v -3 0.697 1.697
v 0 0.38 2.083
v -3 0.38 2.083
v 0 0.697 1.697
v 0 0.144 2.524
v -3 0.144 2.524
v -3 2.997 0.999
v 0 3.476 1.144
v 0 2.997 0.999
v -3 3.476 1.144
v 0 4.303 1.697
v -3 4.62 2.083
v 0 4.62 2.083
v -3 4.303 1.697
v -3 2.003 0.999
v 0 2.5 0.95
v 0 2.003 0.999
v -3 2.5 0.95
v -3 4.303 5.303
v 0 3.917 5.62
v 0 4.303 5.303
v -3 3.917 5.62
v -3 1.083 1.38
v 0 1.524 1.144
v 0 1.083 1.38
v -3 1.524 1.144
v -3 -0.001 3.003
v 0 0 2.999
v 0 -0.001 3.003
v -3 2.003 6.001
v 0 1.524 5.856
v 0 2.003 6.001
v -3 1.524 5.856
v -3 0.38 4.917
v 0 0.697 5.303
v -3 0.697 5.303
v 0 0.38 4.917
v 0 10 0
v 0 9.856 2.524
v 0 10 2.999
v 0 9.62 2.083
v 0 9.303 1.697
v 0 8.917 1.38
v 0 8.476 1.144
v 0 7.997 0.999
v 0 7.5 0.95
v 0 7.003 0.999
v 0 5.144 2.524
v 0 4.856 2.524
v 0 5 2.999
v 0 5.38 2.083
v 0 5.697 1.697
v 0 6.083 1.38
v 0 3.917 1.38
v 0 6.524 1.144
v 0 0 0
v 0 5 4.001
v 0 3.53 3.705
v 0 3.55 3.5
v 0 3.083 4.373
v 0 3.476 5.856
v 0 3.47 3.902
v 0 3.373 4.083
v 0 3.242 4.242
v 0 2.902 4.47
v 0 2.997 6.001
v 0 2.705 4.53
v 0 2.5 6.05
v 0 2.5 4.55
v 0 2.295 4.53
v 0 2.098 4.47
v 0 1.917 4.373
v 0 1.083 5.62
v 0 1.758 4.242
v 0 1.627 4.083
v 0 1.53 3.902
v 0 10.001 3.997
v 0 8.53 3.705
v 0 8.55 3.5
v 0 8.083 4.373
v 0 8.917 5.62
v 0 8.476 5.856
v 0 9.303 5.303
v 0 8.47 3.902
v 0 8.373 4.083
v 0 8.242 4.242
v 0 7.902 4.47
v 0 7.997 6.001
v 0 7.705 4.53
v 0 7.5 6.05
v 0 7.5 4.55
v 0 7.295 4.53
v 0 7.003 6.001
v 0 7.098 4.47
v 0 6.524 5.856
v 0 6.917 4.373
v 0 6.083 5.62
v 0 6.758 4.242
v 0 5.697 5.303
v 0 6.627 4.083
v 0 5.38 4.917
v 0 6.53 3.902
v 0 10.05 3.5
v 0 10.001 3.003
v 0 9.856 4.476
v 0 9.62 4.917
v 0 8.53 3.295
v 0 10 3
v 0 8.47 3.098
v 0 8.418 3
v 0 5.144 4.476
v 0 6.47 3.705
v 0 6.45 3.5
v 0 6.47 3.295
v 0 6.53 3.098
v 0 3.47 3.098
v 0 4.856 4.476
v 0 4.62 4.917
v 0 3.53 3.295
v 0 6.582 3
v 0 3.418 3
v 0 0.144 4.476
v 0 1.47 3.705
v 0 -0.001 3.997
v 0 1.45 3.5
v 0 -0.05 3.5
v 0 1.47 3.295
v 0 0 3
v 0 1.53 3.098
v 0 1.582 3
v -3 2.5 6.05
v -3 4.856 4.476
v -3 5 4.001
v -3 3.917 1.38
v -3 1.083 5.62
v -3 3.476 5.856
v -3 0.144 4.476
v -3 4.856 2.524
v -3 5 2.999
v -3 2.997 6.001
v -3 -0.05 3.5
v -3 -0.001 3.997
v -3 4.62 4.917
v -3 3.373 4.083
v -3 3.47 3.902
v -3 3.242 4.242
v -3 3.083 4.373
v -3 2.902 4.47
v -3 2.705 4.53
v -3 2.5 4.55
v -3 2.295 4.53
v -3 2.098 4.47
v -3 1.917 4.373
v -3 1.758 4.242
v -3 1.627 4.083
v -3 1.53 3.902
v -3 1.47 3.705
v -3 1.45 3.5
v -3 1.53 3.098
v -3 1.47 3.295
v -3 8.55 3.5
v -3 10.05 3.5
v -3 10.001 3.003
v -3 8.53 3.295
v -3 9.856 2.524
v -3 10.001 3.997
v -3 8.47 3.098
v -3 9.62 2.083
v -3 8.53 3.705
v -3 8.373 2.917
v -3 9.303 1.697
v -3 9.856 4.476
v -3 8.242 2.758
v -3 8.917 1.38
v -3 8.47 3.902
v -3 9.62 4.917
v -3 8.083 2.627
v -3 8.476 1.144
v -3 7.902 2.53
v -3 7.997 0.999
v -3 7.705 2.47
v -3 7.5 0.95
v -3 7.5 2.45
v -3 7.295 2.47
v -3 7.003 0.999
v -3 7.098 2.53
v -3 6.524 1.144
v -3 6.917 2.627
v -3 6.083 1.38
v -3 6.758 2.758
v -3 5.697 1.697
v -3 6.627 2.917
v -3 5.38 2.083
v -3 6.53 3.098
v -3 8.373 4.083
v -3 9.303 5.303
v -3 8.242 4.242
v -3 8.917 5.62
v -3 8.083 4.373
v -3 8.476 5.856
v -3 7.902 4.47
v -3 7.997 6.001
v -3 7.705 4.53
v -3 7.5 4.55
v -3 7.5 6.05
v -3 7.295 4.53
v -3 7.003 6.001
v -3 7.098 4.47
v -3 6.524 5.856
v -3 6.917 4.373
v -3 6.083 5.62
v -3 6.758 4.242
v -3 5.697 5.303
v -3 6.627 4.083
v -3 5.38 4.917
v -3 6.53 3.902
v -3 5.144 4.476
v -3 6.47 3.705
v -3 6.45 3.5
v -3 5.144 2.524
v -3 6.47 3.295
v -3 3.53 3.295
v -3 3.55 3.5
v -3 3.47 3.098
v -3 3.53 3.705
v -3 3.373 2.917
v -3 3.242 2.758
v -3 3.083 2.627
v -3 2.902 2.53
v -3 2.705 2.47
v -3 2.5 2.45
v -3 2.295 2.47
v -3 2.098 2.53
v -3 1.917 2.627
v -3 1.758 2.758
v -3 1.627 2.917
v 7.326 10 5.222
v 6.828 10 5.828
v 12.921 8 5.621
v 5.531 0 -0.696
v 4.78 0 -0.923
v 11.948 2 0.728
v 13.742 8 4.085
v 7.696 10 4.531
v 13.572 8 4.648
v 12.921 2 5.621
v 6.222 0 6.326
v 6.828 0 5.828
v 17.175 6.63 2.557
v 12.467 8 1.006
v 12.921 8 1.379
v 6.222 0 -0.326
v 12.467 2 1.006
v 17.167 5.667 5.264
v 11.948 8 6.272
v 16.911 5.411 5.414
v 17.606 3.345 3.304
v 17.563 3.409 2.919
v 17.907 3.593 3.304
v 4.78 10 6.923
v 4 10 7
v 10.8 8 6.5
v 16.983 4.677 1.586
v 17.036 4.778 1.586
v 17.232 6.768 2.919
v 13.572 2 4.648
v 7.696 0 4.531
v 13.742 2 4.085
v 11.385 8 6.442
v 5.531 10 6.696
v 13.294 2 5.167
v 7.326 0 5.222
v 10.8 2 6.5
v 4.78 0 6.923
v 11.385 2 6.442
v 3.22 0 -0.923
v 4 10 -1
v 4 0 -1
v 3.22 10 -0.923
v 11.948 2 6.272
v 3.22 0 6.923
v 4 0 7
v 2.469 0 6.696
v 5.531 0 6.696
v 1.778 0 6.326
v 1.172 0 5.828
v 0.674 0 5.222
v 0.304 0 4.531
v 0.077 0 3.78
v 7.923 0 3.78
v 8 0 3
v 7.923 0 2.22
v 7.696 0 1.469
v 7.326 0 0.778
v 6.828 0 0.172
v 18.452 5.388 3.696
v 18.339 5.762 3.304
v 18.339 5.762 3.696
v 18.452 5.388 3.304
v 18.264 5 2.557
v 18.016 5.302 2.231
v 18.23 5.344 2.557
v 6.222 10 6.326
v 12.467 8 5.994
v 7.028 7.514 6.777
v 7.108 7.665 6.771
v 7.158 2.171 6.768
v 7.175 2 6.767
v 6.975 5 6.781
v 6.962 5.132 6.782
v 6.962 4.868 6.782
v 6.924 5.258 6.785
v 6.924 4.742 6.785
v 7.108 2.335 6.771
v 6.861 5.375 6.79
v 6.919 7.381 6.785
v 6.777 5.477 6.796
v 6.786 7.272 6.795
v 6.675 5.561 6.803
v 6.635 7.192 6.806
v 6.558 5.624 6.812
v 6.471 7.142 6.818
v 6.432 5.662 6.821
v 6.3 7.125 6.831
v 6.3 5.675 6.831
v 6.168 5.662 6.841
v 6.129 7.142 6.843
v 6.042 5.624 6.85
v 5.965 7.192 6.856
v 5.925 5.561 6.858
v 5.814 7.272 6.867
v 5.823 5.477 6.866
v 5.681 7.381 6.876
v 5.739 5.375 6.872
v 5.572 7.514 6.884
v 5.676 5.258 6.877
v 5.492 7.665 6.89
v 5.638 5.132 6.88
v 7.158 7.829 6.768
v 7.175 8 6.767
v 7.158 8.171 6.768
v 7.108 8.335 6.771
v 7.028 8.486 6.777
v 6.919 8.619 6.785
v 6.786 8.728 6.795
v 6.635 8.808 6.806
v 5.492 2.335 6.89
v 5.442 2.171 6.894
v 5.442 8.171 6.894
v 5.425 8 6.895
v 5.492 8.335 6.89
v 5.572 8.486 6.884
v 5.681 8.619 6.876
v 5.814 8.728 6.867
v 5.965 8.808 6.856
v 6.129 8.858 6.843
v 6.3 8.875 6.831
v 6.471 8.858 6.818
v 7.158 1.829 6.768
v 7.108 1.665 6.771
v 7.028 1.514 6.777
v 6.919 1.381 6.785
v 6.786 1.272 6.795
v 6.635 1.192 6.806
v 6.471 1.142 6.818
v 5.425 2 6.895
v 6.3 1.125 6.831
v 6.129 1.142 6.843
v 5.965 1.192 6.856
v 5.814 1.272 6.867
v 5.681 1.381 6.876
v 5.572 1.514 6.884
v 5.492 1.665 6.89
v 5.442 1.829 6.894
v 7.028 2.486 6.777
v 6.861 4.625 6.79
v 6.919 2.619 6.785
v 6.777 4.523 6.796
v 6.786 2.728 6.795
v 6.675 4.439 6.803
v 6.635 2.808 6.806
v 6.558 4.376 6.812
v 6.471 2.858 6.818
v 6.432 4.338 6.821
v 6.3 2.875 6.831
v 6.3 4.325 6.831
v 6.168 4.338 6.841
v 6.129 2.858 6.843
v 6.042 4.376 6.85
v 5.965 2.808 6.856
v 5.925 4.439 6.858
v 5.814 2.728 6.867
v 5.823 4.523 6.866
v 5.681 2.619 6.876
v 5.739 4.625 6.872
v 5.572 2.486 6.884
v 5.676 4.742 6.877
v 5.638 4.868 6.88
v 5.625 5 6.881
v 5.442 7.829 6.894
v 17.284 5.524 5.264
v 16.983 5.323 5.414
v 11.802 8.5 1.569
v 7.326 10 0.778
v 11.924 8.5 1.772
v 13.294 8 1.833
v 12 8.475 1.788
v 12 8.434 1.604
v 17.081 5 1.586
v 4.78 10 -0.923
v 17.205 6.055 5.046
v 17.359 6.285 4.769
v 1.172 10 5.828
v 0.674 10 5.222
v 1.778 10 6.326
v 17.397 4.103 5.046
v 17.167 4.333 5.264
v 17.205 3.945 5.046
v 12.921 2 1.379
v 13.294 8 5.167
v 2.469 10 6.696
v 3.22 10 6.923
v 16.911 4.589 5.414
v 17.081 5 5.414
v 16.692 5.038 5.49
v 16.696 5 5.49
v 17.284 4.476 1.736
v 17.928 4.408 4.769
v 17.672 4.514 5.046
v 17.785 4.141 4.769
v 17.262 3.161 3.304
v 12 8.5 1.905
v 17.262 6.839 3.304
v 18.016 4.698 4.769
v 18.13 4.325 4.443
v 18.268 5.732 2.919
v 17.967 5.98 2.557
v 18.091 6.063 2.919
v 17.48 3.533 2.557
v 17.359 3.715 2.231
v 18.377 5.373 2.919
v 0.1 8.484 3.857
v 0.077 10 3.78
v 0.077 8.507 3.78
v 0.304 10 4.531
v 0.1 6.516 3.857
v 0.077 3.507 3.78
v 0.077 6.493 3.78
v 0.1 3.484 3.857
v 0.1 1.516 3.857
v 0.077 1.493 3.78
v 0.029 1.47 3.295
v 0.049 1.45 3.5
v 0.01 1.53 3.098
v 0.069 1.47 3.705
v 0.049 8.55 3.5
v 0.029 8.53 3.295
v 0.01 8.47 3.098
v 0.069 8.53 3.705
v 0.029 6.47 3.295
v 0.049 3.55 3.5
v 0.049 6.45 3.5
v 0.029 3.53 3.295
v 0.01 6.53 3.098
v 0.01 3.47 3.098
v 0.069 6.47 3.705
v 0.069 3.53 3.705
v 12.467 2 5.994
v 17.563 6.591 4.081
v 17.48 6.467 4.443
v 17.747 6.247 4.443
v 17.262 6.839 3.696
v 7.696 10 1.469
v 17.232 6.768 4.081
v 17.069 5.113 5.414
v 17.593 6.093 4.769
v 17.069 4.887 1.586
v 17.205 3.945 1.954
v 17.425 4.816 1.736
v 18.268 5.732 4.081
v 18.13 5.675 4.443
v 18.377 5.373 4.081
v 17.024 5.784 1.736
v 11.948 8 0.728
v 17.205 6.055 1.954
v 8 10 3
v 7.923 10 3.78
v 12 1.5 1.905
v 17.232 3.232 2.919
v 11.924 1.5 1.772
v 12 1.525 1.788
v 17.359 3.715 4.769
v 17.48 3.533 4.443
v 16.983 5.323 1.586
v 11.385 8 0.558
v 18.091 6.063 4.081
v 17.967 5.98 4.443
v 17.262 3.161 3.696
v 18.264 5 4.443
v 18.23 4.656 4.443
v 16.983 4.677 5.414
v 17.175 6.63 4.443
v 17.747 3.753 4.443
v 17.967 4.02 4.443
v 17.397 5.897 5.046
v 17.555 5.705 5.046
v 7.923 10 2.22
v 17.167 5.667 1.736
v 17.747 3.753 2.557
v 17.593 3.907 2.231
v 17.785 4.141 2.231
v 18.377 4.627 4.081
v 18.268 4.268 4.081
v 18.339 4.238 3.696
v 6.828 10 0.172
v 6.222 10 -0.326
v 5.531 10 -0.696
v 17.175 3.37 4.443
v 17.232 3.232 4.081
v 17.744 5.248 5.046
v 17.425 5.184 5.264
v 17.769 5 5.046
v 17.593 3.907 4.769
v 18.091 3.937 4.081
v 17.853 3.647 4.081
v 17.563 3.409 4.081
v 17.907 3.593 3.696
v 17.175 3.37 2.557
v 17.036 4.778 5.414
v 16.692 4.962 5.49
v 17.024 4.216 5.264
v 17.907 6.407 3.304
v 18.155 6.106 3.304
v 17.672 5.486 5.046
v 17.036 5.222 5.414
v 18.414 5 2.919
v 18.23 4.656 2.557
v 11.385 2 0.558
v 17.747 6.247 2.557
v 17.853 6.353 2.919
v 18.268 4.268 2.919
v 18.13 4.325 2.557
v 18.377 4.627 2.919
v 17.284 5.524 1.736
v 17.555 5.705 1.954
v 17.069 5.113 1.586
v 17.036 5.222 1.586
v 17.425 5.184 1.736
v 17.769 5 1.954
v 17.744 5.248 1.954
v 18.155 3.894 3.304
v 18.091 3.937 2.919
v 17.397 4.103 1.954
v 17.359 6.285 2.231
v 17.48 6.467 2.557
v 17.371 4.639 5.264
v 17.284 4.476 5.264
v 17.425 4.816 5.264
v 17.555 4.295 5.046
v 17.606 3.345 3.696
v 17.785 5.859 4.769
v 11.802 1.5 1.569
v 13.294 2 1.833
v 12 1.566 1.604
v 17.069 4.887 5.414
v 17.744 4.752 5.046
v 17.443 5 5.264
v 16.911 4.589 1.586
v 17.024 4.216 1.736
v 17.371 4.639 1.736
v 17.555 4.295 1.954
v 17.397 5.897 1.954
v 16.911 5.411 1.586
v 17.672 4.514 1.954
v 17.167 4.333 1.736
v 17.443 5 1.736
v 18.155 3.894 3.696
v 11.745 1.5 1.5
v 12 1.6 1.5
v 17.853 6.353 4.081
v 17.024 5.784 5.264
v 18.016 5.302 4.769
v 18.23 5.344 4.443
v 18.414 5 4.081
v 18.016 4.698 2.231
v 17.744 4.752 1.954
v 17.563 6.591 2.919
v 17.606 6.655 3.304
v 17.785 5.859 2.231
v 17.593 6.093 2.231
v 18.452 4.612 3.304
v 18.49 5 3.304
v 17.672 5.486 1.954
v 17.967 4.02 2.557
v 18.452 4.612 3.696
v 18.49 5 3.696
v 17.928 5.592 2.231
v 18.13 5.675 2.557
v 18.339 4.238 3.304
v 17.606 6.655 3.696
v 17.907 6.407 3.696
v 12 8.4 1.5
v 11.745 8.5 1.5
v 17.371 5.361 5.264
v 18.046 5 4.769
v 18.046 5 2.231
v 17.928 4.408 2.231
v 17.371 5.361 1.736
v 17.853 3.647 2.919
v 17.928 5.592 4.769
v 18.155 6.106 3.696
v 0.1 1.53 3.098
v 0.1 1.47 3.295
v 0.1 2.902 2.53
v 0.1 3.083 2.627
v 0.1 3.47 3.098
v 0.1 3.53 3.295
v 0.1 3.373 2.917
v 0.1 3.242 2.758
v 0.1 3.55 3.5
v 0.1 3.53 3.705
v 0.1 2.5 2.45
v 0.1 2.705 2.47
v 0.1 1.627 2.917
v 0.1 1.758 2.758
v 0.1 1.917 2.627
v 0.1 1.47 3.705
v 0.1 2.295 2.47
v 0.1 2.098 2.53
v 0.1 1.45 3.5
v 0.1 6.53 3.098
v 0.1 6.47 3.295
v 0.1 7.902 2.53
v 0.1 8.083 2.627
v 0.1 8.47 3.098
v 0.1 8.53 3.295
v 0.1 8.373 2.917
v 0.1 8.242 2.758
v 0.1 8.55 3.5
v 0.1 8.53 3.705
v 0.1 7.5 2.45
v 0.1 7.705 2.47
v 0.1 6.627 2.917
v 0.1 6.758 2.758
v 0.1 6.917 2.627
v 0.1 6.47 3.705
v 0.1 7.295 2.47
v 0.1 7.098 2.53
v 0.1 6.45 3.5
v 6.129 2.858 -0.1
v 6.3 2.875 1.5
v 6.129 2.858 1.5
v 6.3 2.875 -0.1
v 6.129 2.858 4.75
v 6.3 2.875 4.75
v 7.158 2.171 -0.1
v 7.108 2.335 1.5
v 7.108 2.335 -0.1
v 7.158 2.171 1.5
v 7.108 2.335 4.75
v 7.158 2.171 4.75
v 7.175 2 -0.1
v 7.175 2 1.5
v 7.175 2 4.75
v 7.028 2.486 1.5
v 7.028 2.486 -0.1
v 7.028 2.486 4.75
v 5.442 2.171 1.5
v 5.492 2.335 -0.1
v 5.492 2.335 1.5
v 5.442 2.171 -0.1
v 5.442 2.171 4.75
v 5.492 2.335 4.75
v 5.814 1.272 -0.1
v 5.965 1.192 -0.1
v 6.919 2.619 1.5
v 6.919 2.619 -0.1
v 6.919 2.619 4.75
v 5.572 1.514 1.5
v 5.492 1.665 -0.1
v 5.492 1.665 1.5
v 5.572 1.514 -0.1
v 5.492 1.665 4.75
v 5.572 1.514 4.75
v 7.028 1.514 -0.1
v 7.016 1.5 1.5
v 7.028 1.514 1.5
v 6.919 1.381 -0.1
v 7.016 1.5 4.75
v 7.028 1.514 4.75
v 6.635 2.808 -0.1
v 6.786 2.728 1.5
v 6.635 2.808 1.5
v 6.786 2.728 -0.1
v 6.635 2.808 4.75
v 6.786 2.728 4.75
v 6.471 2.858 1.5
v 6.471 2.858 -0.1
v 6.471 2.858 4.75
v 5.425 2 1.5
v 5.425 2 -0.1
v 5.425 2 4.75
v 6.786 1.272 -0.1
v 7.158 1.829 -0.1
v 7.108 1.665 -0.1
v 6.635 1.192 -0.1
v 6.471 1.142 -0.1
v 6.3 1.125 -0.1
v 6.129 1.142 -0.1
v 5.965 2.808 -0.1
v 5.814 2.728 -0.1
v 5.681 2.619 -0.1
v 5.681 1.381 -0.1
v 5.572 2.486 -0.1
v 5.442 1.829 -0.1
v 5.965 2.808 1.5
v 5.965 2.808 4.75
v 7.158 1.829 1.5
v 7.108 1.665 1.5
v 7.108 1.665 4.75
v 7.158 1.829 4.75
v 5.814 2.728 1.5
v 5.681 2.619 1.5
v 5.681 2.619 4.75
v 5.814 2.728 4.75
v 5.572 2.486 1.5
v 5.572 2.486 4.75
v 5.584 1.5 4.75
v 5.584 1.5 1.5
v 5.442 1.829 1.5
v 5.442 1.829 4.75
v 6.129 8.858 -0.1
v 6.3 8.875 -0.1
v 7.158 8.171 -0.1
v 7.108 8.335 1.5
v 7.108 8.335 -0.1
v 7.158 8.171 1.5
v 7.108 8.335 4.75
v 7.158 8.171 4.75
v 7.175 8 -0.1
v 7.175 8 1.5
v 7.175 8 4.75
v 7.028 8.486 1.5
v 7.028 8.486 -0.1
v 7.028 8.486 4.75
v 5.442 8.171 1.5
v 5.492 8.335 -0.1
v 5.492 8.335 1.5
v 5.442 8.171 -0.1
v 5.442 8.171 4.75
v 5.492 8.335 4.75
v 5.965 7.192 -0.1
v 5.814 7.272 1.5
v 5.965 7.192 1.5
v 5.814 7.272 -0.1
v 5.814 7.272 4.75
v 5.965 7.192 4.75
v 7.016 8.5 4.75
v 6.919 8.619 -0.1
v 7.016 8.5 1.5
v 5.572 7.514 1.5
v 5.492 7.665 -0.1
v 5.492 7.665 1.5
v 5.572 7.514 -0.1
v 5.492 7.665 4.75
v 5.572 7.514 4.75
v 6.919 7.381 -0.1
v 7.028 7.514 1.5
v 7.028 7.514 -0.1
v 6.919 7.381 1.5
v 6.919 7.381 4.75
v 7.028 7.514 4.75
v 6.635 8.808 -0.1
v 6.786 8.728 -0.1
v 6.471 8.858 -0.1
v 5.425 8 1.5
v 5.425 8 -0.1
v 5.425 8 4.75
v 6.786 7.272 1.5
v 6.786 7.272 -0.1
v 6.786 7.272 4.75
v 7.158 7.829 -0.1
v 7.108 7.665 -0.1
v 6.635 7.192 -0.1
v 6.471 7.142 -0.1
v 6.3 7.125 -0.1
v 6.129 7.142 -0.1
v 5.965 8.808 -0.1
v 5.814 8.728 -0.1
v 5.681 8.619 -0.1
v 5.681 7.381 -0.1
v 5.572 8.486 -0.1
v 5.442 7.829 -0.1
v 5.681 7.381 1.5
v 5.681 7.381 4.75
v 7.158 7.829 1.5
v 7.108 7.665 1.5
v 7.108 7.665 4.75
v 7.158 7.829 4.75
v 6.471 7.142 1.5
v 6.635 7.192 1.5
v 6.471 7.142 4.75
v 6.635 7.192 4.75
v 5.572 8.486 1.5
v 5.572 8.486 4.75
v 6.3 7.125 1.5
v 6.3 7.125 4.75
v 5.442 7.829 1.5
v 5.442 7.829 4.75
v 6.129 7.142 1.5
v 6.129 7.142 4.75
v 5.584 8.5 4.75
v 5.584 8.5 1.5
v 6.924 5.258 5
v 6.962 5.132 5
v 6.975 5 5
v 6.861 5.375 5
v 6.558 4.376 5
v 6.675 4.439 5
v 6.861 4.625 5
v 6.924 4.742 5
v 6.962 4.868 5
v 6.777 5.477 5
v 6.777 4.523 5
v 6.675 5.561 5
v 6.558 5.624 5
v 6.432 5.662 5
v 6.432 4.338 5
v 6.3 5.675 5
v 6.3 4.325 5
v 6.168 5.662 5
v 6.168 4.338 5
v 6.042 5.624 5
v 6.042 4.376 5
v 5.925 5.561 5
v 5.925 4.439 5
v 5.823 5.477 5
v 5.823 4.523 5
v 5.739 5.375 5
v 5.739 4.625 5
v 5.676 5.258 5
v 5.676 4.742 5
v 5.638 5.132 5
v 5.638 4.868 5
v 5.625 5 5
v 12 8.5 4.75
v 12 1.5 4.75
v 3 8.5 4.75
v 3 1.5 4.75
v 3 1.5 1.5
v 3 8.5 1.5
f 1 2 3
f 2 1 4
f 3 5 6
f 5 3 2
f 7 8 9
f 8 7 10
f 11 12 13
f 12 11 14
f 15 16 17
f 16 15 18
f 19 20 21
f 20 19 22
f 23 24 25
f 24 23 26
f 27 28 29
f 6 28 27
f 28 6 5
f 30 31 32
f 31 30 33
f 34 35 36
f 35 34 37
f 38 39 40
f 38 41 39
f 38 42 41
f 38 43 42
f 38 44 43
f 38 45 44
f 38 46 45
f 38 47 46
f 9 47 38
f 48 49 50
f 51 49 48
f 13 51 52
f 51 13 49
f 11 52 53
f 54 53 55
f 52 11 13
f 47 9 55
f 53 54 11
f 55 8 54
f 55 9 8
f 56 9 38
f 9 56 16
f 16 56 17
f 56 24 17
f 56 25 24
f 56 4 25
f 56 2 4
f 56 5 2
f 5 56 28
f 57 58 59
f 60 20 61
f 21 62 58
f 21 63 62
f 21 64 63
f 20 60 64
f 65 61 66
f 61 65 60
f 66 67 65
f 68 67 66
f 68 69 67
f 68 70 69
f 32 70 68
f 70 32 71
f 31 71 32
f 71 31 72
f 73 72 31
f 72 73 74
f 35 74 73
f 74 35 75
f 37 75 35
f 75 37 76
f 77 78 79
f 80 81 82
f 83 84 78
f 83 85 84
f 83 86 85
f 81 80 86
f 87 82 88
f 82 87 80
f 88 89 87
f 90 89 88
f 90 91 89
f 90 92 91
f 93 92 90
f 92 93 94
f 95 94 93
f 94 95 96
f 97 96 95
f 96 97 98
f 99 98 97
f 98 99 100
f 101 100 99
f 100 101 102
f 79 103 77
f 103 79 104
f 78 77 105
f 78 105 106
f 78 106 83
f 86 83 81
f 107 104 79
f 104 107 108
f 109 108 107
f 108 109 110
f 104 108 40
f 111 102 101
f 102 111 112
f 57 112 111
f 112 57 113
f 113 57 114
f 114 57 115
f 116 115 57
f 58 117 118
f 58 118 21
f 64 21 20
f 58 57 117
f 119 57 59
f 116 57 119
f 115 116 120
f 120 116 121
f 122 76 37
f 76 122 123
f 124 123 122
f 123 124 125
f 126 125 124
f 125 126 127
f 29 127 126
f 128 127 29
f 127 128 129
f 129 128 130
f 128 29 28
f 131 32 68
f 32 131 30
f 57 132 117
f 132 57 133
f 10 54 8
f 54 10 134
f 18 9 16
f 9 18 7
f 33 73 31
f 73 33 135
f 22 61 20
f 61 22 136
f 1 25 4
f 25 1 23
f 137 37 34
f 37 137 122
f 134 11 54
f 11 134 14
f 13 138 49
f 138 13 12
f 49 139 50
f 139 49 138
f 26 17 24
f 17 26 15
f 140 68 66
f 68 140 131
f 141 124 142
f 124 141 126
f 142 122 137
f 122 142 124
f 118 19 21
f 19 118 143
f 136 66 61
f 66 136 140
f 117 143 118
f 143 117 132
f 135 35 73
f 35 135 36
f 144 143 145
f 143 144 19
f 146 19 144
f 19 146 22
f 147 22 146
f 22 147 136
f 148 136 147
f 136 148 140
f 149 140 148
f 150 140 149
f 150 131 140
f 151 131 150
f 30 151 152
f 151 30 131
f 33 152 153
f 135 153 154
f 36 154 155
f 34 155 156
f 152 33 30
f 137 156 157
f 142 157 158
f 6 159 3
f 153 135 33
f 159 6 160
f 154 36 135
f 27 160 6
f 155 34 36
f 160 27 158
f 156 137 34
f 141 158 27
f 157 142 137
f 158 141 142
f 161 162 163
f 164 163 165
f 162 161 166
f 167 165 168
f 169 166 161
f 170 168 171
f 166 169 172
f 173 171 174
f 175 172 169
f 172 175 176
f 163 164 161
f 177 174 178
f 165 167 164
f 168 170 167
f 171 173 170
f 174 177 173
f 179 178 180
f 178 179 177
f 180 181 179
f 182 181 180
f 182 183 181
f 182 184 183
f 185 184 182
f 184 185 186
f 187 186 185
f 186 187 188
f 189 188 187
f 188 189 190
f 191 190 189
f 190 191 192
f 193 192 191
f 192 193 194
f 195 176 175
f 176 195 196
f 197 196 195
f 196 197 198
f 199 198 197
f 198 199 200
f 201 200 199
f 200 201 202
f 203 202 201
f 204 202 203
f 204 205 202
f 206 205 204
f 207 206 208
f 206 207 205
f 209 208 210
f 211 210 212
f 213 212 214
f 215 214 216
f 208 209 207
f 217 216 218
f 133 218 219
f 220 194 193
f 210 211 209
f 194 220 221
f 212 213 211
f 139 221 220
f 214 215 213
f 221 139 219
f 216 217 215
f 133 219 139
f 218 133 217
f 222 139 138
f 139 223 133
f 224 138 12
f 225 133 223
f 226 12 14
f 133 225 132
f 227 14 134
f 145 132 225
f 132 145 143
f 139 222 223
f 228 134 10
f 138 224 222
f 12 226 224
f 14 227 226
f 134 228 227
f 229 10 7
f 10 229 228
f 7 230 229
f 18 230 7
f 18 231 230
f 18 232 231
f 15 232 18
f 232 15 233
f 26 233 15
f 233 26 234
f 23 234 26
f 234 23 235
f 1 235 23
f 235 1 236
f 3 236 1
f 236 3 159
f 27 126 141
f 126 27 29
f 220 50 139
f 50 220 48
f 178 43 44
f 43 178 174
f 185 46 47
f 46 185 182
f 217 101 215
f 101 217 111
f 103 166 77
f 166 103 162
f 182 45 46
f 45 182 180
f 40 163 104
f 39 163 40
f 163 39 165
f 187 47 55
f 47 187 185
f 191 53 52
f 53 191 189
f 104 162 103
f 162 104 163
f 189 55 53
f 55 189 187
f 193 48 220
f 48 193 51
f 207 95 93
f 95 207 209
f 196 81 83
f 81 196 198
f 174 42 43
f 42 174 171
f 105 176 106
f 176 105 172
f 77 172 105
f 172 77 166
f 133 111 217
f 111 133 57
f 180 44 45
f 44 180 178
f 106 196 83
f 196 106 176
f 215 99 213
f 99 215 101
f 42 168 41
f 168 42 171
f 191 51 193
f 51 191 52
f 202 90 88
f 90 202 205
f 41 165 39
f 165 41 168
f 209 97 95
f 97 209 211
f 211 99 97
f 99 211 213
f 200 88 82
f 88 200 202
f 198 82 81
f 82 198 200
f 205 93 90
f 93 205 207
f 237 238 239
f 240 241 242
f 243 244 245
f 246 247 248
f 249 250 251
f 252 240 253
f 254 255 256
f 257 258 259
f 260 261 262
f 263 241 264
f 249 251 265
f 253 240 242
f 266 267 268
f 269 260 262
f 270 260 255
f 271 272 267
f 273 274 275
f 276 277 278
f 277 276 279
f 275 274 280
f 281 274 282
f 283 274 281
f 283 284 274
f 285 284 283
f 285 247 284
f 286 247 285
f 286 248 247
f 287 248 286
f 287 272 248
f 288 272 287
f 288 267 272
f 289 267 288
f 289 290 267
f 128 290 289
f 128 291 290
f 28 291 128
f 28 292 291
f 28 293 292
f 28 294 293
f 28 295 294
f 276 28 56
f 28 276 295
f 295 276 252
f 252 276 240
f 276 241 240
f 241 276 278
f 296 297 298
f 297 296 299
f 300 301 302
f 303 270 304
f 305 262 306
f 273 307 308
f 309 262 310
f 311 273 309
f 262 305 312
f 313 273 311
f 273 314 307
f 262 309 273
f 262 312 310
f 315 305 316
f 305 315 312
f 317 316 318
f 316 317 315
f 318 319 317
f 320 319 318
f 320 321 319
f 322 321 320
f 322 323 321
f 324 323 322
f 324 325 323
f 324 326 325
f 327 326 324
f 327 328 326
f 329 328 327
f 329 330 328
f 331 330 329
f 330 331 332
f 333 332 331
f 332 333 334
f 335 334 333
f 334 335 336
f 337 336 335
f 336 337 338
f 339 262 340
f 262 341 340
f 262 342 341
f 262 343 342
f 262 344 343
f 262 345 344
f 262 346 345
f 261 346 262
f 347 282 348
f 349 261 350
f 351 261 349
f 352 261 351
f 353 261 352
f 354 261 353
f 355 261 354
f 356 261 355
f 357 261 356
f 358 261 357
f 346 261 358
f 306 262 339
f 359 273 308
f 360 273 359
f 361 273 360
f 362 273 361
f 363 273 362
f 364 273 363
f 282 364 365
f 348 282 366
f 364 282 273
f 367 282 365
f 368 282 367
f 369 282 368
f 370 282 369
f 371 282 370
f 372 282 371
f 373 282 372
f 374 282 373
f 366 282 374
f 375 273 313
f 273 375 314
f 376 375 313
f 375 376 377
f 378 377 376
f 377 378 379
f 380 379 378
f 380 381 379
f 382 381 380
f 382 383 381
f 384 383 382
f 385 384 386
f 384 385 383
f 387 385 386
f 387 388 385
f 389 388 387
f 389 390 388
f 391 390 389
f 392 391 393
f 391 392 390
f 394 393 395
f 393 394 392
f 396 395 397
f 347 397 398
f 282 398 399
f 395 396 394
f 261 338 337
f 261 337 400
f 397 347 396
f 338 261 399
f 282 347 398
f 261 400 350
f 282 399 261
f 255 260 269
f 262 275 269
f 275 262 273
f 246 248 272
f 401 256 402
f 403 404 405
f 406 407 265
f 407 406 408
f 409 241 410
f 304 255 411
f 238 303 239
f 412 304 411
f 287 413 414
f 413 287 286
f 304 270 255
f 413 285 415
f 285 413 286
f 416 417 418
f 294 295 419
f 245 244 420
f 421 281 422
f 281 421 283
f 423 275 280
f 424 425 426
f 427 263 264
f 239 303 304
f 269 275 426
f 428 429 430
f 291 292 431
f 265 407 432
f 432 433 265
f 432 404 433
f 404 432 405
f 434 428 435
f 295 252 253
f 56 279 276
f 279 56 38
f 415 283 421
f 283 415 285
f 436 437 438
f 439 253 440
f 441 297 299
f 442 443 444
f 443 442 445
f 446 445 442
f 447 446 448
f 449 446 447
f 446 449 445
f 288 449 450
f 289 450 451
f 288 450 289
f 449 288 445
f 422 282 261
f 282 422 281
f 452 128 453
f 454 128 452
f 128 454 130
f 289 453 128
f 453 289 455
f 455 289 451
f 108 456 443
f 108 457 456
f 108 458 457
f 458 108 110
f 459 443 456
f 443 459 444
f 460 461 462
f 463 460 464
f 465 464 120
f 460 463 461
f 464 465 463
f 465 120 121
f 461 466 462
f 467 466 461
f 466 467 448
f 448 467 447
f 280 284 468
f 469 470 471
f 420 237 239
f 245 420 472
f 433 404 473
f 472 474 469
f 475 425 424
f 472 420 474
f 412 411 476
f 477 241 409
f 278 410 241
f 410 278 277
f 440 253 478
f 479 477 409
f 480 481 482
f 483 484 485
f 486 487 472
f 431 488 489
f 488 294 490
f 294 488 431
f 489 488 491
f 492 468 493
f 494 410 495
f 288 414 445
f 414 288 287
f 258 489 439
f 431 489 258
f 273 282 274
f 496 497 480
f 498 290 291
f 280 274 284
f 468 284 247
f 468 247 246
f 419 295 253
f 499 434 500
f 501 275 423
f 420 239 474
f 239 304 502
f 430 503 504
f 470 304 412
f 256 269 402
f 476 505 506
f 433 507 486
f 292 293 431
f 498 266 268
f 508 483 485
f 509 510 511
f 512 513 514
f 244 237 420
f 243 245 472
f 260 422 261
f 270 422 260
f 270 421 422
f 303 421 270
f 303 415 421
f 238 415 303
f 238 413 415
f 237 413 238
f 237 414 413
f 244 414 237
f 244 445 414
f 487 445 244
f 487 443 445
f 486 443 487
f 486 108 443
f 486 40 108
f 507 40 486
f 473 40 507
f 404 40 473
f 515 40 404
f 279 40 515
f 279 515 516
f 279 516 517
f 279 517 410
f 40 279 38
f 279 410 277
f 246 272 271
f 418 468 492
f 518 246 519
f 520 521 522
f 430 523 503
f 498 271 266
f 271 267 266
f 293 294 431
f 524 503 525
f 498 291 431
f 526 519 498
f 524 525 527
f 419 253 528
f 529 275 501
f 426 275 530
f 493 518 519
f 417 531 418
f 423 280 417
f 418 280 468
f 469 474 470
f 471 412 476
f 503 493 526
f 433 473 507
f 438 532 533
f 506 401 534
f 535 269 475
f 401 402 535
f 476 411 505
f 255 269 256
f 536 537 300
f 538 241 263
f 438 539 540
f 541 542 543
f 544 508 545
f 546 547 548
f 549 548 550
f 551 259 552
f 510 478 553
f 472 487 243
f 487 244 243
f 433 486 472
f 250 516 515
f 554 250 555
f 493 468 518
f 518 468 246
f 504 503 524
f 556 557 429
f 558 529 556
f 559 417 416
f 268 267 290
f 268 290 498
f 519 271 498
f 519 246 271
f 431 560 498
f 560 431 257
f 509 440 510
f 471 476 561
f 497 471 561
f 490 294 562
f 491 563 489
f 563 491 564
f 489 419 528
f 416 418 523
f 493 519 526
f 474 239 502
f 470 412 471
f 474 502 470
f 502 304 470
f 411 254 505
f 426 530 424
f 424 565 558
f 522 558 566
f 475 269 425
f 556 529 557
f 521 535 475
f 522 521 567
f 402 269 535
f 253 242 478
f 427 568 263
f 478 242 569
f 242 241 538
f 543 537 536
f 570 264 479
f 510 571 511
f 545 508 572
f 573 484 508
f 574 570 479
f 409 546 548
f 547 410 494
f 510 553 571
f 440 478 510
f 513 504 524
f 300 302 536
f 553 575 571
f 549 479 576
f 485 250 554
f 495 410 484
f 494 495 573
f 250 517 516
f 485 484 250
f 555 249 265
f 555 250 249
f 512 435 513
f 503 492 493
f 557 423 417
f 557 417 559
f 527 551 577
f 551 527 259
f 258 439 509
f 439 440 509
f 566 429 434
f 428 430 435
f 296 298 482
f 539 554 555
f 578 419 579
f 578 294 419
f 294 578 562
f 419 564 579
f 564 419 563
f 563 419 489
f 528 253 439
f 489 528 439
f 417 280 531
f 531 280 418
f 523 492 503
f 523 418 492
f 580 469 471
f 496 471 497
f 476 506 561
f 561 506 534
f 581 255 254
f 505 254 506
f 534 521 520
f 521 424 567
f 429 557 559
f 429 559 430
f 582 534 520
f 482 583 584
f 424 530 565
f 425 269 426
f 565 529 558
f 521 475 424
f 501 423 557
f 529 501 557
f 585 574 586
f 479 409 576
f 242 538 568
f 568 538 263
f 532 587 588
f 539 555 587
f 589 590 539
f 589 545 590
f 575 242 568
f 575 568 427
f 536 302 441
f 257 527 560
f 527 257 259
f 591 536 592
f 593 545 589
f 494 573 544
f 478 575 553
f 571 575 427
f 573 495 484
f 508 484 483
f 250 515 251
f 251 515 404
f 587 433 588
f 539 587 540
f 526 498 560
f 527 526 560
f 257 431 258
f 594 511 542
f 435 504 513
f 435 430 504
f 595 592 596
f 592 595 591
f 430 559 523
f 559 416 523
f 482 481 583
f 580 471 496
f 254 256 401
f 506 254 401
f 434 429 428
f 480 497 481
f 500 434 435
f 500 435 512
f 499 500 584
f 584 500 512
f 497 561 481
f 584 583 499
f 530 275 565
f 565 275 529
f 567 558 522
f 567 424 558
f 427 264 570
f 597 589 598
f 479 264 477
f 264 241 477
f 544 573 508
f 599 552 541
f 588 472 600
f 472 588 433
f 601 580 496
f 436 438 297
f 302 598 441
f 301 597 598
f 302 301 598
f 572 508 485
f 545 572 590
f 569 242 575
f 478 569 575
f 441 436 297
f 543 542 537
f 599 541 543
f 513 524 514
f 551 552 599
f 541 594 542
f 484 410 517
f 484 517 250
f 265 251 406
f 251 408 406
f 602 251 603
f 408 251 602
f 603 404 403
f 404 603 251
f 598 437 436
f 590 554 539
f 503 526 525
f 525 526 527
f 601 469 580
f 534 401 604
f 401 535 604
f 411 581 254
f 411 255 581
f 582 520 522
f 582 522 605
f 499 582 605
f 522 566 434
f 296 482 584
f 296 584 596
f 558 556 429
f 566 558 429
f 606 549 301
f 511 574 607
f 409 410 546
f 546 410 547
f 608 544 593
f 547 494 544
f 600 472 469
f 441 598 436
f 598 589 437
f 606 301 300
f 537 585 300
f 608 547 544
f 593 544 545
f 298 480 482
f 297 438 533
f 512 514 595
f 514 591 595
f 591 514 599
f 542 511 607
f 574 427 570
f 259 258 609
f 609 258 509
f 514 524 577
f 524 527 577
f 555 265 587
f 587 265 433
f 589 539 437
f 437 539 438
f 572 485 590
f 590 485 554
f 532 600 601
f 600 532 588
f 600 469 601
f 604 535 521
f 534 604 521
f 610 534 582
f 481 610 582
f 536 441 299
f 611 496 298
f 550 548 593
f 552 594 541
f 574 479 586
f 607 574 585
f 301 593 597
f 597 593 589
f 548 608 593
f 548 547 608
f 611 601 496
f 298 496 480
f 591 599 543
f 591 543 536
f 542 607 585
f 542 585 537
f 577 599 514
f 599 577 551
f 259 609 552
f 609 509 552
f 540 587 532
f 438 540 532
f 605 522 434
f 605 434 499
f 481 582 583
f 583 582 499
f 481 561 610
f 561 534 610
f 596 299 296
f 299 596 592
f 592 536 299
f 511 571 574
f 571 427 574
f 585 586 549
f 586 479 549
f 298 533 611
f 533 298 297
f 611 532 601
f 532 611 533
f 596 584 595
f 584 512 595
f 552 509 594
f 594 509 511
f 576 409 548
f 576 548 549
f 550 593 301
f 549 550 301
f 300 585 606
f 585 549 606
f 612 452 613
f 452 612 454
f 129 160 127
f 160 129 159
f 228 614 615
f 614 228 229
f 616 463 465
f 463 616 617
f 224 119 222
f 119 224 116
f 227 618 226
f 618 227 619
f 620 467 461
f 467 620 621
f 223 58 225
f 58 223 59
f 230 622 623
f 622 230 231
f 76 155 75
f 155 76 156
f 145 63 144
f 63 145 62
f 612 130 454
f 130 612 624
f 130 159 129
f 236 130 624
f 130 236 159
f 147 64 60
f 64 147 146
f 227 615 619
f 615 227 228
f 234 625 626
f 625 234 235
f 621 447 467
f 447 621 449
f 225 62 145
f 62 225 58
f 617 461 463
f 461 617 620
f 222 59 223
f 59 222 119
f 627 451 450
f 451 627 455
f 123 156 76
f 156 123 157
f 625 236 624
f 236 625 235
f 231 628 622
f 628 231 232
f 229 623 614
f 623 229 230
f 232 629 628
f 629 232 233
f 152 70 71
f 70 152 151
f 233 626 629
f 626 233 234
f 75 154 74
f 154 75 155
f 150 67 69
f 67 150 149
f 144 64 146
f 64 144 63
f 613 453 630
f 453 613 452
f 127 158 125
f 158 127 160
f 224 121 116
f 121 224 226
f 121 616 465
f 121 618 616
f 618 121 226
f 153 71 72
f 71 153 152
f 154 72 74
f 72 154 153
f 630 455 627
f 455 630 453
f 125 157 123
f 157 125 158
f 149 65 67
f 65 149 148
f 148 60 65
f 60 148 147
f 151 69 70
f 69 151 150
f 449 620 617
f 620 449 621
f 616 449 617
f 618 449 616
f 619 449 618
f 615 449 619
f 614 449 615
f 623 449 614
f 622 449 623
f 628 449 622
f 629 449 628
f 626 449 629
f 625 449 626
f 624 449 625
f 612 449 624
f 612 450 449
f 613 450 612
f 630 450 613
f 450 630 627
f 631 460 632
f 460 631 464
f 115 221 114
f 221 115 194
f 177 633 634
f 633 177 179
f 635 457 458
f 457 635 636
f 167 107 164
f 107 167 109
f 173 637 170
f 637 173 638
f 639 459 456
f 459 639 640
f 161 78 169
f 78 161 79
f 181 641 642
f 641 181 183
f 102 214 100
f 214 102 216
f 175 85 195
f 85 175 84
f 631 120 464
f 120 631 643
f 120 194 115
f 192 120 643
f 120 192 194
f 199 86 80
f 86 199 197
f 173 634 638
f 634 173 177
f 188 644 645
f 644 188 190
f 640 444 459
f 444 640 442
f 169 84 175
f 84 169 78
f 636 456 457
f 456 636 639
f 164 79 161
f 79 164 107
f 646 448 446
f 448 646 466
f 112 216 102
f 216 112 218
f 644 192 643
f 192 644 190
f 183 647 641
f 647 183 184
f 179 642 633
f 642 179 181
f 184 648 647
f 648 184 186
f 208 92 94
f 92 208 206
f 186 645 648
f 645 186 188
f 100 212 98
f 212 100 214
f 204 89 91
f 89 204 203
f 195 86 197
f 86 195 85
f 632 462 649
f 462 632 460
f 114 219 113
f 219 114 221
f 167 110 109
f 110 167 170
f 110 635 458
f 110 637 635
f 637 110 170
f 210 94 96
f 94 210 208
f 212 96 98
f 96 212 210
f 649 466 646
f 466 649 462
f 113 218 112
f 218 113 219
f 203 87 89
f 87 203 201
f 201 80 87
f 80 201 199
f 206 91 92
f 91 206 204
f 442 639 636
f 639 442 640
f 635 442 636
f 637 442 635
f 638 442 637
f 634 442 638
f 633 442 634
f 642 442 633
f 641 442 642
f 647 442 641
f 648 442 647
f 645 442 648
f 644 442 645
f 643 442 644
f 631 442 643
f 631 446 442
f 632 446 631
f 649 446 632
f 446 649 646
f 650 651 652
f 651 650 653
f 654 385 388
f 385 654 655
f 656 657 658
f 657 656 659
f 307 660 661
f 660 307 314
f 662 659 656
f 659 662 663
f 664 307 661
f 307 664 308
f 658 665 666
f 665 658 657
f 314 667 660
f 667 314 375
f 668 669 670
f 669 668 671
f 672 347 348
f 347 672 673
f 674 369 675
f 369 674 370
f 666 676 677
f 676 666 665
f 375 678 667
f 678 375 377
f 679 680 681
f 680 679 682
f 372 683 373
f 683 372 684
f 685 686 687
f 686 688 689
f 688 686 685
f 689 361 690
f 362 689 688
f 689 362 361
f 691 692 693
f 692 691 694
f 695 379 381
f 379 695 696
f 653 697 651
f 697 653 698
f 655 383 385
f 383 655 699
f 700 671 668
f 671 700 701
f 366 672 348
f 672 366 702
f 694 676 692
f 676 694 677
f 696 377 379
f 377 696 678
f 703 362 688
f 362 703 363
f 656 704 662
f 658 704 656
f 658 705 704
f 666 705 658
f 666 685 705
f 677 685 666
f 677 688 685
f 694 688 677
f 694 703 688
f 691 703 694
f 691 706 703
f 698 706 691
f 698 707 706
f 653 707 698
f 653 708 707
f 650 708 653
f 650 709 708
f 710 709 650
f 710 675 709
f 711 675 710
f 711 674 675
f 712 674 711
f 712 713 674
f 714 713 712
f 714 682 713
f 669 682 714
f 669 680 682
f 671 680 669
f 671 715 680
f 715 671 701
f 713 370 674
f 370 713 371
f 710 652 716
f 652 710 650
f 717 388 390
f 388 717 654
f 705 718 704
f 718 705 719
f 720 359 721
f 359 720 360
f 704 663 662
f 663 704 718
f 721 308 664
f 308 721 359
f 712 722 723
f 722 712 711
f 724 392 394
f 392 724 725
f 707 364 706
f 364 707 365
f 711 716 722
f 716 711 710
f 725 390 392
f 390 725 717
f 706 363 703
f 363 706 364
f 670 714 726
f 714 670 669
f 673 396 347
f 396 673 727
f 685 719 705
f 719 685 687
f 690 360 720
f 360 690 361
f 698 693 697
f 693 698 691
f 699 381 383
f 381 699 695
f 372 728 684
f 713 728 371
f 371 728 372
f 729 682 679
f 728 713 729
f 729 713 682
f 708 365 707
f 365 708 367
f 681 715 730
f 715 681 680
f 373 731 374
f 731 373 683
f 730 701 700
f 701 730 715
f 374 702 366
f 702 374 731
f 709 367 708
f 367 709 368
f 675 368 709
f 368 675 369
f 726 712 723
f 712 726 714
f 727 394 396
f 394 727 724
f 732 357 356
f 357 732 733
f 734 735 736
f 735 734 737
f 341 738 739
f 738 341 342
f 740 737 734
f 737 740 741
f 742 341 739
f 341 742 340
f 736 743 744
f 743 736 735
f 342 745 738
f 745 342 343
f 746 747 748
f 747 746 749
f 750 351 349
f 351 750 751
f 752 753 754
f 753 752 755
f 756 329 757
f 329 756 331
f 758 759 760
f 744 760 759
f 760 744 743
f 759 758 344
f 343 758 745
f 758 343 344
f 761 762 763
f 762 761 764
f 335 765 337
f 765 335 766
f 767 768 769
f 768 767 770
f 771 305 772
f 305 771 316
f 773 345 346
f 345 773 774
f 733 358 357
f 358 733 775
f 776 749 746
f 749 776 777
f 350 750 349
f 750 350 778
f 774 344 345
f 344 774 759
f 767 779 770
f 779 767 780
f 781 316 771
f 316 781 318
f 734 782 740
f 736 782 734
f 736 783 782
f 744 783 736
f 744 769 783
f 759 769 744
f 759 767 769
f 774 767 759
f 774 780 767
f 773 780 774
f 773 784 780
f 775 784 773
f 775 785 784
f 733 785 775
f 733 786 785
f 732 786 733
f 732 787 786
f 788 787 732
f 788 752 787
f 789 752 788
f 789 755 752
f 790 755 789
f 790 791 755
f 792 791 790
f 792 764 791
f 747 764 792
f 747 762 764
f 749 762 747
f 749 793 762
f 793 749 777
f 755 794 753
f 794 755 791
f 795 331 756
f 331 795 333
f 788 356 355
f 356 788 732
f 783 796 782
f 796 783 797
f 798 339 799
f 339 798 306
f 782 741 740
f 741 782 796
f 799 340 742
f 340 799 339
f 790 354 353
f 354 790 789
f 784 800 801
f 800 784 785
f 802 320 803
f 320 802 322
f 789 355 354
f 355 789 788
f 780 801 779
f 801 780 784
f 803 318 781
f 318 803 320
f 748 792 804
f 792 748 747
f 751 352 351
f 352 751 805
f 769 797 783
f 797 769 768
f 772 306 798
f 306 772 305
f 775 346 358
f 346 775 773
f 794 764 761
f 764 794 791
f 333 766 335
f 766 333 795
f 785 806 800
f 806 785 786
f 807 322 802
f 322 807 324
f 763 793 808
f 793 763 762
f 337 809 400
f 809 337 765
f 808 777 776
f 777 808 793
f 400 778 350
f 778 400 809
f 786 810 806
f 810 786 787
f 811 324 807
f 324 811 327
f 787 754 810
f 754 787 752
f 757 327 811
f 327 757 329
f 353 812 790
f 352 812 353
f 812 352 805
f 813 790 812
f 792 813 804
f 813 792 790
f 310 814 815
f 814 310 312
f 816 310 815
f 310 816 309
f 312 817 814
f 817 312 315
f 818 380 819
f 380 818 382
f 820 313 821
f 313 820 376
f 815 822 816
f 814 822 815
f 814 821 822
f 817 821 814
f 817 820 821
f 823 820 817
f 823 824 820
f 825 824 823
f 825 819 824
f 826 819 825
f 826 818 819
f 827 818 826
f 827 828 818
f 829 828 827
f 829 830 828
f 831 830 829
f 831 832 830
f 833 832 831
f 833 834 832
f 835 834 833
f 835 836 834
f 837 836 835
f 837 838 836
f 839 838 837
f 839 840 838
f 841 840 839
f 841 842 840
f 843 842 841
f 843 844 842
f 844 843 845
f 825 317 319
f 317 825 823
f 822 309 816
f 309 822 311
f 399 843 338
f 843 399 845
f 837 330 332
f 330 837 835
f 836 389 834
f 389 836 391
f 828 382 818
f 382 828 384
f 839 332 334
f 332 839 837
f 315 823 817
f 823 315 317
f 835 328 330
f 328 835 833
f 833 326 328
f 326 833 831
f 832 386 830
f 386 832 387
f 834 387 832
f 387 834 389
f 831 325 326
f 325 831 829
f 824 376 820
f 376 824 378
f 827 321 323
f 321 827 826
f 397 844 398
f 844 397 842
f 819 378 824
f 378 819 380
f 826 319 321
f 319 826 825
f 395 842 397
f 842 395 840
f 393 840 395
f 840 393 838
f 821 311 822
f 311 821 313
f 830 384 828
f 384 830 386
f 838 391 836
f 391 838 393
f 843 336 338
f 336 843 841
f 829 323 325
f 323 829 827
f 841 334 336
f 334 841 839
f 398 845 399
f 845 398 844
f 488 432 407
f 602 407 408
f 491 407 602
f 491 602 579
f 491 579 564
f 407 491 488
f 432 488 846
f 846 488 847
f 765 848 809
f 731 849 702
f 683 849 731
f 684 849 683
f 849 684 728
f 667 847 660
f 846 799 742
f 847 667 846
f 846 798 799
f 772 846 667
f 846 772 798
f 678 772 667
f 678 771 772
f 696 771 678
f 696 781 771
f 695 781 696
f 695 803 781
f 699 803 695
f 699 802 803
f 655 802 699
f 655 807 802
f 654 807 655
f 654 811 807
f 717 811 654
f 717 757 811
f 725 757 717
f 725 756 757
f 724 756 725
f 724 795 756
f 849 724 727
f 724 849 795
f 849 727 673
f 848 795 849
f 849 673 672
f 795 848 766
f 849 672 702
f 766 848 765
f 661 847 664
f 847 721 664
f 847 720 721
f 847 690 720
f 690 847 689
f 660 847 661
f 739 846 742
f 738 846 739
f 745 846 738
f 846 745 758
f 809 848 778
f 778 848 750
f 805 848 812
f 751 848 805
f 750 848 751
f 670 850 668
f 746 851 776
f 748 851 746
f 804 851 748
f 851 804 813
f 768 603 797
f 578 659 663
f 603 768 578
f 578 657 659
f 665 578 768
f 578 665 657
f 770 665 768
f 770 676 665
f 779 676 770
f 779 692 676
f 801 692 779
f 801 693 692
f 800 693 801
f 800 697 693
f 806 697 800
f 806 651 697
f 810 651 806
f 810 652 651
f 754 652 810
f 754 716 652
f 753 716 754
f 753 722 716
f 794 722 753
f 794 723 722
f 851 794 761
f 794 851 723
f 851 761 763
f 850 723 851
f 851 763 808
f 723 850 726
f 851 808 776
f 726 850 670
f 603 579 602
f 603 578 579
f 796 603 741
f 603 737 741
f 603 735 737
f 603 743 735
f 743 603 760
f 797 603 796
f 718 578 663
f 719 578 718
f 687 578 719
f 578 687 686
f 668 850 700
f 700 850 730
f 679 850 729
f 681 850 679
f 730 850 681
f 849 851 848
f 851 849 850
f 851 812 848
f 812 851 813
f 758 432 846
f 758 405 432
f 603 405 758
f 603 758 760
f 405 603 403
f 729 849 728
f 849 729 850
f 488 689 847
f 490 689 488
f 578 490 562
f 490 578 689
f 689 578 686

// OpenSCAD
// ============================================================
// finger_segment_fingertip.scad
// Rounded Fingertip – final segment of the finger
// Smooth, natural-looking tip with gradual taper
//
// Print Settings:
//   Material:    PLA
//   Infill:      15%
//   Layer height: 0.2 mm
//   Supports:    None required
//   Weight:      ~2 g
//   Print time:  ~2 minutes
// ============================================================

$fn = 32;
$fa = 6;
$fs = 1;

// --- Parametric Variables ---
length                = 18;   // mm  slightly shorter than other segments
width                 = 10;   // mm
thickness             = 7;    // mm
tip_radius            = 1.5;  // mm  rounded endpoint radius
taper_angle           = 10;   // degrees  gradual taper to tip
hinge_pin_diameter    = 2;    // mm  connects to distal segment
hinge_pin_bore        = 2.1;  // mm  (0.1 mm tolerance)
tendon_hole_diameter  = 1.35; // mm
elastic_hole_diameter = 1.75; // mm
wall_min              = 1.5;  // mm

// Derived
taper_offset  = length * tan(taper_angle);
tip_width     = max(width - 2 * taper_offset, tip_radius * 3);
hinge_boss_od = hinge_pin_bore + wall_min * 2;
hinge_boss_depth = 3.0;

// ============================================================
// Module: fingertip_body
// Tapered body ending in a smooth hemispherical tip
// ============================================================
module fingertip_body() {
    hull() {
        // Proximal (hinge) end – full width rectangle
        cube([2, width, thickness / 4]);
        translate([4, width / 2, thickness - 4])
            rotate([90, 0, 0])
                cylinder(r = 4, h = width, center = true);
        // Mid-section
        translate([length * 0.6, width / 2, thickness / 2])
            rotate([90, 0, 0])
                cylinder(r = thickness / 2 - 0.5, h = width * 0.6, center = true);
        // Rounded tip (sphere-ish)
        translate([length - tip_radius,
                   width / 2,
                   thickness / 2])
            sphere(r = tip_radius + 0.5);
    }
}

// ============================================================
// Module: finger_segment_fingertip
// ============================================================
module finger_segment_fingertip() {
    difference() {
        union() {
            fingertip_body();
            // Proximal hinge bosses
            for (y_pos = [width * 0.25, width * 0.75])
                translate([-hinge_boss_depth, y_pos, thickness / 2])
                    rotate([0, 90, 0])
                        cylinder(d = hinge_boss_od, h = hinge_boss_depth);
        }
        // Proximal hinge pin bores
        for (y_pos = [width * 0.25, width * 0.75])
            translate([-hinge_boss_depth - 0.1, y_pos, thickness / 2])
                rotate([0, 90, 0])
                    cylinder(d = hinge_pin_bore, h = hinge_boss_depth + 0.2);
        // Tendon hole (top face, near proximal end)
        translate([length * 0.35, width / 2, thickness - 2])
            cylinder(d = tendon_hole_diameter, h = 2.1);
        // Elastic holes (bottom face)
        for (dy = [-3, 3])
            translate([length * 0.35, width / 2 + dy, -0.1])
                cylinder(d = elastic_hole_diameter, h = thickness + 0.2);
        // Internal lightening cavity
        translate([wall_min * 2, wall_min, wall_min])
            cube([length - wall_min * 4 - tip_radius * 2,
                  width  - wall_min * 2,
                  thickness - wall_min * 2.5]);
    }
}

// ============================================================
// Render
// ============================================================
color("CornflowerBlue")
    finger_segment_fingertip();
